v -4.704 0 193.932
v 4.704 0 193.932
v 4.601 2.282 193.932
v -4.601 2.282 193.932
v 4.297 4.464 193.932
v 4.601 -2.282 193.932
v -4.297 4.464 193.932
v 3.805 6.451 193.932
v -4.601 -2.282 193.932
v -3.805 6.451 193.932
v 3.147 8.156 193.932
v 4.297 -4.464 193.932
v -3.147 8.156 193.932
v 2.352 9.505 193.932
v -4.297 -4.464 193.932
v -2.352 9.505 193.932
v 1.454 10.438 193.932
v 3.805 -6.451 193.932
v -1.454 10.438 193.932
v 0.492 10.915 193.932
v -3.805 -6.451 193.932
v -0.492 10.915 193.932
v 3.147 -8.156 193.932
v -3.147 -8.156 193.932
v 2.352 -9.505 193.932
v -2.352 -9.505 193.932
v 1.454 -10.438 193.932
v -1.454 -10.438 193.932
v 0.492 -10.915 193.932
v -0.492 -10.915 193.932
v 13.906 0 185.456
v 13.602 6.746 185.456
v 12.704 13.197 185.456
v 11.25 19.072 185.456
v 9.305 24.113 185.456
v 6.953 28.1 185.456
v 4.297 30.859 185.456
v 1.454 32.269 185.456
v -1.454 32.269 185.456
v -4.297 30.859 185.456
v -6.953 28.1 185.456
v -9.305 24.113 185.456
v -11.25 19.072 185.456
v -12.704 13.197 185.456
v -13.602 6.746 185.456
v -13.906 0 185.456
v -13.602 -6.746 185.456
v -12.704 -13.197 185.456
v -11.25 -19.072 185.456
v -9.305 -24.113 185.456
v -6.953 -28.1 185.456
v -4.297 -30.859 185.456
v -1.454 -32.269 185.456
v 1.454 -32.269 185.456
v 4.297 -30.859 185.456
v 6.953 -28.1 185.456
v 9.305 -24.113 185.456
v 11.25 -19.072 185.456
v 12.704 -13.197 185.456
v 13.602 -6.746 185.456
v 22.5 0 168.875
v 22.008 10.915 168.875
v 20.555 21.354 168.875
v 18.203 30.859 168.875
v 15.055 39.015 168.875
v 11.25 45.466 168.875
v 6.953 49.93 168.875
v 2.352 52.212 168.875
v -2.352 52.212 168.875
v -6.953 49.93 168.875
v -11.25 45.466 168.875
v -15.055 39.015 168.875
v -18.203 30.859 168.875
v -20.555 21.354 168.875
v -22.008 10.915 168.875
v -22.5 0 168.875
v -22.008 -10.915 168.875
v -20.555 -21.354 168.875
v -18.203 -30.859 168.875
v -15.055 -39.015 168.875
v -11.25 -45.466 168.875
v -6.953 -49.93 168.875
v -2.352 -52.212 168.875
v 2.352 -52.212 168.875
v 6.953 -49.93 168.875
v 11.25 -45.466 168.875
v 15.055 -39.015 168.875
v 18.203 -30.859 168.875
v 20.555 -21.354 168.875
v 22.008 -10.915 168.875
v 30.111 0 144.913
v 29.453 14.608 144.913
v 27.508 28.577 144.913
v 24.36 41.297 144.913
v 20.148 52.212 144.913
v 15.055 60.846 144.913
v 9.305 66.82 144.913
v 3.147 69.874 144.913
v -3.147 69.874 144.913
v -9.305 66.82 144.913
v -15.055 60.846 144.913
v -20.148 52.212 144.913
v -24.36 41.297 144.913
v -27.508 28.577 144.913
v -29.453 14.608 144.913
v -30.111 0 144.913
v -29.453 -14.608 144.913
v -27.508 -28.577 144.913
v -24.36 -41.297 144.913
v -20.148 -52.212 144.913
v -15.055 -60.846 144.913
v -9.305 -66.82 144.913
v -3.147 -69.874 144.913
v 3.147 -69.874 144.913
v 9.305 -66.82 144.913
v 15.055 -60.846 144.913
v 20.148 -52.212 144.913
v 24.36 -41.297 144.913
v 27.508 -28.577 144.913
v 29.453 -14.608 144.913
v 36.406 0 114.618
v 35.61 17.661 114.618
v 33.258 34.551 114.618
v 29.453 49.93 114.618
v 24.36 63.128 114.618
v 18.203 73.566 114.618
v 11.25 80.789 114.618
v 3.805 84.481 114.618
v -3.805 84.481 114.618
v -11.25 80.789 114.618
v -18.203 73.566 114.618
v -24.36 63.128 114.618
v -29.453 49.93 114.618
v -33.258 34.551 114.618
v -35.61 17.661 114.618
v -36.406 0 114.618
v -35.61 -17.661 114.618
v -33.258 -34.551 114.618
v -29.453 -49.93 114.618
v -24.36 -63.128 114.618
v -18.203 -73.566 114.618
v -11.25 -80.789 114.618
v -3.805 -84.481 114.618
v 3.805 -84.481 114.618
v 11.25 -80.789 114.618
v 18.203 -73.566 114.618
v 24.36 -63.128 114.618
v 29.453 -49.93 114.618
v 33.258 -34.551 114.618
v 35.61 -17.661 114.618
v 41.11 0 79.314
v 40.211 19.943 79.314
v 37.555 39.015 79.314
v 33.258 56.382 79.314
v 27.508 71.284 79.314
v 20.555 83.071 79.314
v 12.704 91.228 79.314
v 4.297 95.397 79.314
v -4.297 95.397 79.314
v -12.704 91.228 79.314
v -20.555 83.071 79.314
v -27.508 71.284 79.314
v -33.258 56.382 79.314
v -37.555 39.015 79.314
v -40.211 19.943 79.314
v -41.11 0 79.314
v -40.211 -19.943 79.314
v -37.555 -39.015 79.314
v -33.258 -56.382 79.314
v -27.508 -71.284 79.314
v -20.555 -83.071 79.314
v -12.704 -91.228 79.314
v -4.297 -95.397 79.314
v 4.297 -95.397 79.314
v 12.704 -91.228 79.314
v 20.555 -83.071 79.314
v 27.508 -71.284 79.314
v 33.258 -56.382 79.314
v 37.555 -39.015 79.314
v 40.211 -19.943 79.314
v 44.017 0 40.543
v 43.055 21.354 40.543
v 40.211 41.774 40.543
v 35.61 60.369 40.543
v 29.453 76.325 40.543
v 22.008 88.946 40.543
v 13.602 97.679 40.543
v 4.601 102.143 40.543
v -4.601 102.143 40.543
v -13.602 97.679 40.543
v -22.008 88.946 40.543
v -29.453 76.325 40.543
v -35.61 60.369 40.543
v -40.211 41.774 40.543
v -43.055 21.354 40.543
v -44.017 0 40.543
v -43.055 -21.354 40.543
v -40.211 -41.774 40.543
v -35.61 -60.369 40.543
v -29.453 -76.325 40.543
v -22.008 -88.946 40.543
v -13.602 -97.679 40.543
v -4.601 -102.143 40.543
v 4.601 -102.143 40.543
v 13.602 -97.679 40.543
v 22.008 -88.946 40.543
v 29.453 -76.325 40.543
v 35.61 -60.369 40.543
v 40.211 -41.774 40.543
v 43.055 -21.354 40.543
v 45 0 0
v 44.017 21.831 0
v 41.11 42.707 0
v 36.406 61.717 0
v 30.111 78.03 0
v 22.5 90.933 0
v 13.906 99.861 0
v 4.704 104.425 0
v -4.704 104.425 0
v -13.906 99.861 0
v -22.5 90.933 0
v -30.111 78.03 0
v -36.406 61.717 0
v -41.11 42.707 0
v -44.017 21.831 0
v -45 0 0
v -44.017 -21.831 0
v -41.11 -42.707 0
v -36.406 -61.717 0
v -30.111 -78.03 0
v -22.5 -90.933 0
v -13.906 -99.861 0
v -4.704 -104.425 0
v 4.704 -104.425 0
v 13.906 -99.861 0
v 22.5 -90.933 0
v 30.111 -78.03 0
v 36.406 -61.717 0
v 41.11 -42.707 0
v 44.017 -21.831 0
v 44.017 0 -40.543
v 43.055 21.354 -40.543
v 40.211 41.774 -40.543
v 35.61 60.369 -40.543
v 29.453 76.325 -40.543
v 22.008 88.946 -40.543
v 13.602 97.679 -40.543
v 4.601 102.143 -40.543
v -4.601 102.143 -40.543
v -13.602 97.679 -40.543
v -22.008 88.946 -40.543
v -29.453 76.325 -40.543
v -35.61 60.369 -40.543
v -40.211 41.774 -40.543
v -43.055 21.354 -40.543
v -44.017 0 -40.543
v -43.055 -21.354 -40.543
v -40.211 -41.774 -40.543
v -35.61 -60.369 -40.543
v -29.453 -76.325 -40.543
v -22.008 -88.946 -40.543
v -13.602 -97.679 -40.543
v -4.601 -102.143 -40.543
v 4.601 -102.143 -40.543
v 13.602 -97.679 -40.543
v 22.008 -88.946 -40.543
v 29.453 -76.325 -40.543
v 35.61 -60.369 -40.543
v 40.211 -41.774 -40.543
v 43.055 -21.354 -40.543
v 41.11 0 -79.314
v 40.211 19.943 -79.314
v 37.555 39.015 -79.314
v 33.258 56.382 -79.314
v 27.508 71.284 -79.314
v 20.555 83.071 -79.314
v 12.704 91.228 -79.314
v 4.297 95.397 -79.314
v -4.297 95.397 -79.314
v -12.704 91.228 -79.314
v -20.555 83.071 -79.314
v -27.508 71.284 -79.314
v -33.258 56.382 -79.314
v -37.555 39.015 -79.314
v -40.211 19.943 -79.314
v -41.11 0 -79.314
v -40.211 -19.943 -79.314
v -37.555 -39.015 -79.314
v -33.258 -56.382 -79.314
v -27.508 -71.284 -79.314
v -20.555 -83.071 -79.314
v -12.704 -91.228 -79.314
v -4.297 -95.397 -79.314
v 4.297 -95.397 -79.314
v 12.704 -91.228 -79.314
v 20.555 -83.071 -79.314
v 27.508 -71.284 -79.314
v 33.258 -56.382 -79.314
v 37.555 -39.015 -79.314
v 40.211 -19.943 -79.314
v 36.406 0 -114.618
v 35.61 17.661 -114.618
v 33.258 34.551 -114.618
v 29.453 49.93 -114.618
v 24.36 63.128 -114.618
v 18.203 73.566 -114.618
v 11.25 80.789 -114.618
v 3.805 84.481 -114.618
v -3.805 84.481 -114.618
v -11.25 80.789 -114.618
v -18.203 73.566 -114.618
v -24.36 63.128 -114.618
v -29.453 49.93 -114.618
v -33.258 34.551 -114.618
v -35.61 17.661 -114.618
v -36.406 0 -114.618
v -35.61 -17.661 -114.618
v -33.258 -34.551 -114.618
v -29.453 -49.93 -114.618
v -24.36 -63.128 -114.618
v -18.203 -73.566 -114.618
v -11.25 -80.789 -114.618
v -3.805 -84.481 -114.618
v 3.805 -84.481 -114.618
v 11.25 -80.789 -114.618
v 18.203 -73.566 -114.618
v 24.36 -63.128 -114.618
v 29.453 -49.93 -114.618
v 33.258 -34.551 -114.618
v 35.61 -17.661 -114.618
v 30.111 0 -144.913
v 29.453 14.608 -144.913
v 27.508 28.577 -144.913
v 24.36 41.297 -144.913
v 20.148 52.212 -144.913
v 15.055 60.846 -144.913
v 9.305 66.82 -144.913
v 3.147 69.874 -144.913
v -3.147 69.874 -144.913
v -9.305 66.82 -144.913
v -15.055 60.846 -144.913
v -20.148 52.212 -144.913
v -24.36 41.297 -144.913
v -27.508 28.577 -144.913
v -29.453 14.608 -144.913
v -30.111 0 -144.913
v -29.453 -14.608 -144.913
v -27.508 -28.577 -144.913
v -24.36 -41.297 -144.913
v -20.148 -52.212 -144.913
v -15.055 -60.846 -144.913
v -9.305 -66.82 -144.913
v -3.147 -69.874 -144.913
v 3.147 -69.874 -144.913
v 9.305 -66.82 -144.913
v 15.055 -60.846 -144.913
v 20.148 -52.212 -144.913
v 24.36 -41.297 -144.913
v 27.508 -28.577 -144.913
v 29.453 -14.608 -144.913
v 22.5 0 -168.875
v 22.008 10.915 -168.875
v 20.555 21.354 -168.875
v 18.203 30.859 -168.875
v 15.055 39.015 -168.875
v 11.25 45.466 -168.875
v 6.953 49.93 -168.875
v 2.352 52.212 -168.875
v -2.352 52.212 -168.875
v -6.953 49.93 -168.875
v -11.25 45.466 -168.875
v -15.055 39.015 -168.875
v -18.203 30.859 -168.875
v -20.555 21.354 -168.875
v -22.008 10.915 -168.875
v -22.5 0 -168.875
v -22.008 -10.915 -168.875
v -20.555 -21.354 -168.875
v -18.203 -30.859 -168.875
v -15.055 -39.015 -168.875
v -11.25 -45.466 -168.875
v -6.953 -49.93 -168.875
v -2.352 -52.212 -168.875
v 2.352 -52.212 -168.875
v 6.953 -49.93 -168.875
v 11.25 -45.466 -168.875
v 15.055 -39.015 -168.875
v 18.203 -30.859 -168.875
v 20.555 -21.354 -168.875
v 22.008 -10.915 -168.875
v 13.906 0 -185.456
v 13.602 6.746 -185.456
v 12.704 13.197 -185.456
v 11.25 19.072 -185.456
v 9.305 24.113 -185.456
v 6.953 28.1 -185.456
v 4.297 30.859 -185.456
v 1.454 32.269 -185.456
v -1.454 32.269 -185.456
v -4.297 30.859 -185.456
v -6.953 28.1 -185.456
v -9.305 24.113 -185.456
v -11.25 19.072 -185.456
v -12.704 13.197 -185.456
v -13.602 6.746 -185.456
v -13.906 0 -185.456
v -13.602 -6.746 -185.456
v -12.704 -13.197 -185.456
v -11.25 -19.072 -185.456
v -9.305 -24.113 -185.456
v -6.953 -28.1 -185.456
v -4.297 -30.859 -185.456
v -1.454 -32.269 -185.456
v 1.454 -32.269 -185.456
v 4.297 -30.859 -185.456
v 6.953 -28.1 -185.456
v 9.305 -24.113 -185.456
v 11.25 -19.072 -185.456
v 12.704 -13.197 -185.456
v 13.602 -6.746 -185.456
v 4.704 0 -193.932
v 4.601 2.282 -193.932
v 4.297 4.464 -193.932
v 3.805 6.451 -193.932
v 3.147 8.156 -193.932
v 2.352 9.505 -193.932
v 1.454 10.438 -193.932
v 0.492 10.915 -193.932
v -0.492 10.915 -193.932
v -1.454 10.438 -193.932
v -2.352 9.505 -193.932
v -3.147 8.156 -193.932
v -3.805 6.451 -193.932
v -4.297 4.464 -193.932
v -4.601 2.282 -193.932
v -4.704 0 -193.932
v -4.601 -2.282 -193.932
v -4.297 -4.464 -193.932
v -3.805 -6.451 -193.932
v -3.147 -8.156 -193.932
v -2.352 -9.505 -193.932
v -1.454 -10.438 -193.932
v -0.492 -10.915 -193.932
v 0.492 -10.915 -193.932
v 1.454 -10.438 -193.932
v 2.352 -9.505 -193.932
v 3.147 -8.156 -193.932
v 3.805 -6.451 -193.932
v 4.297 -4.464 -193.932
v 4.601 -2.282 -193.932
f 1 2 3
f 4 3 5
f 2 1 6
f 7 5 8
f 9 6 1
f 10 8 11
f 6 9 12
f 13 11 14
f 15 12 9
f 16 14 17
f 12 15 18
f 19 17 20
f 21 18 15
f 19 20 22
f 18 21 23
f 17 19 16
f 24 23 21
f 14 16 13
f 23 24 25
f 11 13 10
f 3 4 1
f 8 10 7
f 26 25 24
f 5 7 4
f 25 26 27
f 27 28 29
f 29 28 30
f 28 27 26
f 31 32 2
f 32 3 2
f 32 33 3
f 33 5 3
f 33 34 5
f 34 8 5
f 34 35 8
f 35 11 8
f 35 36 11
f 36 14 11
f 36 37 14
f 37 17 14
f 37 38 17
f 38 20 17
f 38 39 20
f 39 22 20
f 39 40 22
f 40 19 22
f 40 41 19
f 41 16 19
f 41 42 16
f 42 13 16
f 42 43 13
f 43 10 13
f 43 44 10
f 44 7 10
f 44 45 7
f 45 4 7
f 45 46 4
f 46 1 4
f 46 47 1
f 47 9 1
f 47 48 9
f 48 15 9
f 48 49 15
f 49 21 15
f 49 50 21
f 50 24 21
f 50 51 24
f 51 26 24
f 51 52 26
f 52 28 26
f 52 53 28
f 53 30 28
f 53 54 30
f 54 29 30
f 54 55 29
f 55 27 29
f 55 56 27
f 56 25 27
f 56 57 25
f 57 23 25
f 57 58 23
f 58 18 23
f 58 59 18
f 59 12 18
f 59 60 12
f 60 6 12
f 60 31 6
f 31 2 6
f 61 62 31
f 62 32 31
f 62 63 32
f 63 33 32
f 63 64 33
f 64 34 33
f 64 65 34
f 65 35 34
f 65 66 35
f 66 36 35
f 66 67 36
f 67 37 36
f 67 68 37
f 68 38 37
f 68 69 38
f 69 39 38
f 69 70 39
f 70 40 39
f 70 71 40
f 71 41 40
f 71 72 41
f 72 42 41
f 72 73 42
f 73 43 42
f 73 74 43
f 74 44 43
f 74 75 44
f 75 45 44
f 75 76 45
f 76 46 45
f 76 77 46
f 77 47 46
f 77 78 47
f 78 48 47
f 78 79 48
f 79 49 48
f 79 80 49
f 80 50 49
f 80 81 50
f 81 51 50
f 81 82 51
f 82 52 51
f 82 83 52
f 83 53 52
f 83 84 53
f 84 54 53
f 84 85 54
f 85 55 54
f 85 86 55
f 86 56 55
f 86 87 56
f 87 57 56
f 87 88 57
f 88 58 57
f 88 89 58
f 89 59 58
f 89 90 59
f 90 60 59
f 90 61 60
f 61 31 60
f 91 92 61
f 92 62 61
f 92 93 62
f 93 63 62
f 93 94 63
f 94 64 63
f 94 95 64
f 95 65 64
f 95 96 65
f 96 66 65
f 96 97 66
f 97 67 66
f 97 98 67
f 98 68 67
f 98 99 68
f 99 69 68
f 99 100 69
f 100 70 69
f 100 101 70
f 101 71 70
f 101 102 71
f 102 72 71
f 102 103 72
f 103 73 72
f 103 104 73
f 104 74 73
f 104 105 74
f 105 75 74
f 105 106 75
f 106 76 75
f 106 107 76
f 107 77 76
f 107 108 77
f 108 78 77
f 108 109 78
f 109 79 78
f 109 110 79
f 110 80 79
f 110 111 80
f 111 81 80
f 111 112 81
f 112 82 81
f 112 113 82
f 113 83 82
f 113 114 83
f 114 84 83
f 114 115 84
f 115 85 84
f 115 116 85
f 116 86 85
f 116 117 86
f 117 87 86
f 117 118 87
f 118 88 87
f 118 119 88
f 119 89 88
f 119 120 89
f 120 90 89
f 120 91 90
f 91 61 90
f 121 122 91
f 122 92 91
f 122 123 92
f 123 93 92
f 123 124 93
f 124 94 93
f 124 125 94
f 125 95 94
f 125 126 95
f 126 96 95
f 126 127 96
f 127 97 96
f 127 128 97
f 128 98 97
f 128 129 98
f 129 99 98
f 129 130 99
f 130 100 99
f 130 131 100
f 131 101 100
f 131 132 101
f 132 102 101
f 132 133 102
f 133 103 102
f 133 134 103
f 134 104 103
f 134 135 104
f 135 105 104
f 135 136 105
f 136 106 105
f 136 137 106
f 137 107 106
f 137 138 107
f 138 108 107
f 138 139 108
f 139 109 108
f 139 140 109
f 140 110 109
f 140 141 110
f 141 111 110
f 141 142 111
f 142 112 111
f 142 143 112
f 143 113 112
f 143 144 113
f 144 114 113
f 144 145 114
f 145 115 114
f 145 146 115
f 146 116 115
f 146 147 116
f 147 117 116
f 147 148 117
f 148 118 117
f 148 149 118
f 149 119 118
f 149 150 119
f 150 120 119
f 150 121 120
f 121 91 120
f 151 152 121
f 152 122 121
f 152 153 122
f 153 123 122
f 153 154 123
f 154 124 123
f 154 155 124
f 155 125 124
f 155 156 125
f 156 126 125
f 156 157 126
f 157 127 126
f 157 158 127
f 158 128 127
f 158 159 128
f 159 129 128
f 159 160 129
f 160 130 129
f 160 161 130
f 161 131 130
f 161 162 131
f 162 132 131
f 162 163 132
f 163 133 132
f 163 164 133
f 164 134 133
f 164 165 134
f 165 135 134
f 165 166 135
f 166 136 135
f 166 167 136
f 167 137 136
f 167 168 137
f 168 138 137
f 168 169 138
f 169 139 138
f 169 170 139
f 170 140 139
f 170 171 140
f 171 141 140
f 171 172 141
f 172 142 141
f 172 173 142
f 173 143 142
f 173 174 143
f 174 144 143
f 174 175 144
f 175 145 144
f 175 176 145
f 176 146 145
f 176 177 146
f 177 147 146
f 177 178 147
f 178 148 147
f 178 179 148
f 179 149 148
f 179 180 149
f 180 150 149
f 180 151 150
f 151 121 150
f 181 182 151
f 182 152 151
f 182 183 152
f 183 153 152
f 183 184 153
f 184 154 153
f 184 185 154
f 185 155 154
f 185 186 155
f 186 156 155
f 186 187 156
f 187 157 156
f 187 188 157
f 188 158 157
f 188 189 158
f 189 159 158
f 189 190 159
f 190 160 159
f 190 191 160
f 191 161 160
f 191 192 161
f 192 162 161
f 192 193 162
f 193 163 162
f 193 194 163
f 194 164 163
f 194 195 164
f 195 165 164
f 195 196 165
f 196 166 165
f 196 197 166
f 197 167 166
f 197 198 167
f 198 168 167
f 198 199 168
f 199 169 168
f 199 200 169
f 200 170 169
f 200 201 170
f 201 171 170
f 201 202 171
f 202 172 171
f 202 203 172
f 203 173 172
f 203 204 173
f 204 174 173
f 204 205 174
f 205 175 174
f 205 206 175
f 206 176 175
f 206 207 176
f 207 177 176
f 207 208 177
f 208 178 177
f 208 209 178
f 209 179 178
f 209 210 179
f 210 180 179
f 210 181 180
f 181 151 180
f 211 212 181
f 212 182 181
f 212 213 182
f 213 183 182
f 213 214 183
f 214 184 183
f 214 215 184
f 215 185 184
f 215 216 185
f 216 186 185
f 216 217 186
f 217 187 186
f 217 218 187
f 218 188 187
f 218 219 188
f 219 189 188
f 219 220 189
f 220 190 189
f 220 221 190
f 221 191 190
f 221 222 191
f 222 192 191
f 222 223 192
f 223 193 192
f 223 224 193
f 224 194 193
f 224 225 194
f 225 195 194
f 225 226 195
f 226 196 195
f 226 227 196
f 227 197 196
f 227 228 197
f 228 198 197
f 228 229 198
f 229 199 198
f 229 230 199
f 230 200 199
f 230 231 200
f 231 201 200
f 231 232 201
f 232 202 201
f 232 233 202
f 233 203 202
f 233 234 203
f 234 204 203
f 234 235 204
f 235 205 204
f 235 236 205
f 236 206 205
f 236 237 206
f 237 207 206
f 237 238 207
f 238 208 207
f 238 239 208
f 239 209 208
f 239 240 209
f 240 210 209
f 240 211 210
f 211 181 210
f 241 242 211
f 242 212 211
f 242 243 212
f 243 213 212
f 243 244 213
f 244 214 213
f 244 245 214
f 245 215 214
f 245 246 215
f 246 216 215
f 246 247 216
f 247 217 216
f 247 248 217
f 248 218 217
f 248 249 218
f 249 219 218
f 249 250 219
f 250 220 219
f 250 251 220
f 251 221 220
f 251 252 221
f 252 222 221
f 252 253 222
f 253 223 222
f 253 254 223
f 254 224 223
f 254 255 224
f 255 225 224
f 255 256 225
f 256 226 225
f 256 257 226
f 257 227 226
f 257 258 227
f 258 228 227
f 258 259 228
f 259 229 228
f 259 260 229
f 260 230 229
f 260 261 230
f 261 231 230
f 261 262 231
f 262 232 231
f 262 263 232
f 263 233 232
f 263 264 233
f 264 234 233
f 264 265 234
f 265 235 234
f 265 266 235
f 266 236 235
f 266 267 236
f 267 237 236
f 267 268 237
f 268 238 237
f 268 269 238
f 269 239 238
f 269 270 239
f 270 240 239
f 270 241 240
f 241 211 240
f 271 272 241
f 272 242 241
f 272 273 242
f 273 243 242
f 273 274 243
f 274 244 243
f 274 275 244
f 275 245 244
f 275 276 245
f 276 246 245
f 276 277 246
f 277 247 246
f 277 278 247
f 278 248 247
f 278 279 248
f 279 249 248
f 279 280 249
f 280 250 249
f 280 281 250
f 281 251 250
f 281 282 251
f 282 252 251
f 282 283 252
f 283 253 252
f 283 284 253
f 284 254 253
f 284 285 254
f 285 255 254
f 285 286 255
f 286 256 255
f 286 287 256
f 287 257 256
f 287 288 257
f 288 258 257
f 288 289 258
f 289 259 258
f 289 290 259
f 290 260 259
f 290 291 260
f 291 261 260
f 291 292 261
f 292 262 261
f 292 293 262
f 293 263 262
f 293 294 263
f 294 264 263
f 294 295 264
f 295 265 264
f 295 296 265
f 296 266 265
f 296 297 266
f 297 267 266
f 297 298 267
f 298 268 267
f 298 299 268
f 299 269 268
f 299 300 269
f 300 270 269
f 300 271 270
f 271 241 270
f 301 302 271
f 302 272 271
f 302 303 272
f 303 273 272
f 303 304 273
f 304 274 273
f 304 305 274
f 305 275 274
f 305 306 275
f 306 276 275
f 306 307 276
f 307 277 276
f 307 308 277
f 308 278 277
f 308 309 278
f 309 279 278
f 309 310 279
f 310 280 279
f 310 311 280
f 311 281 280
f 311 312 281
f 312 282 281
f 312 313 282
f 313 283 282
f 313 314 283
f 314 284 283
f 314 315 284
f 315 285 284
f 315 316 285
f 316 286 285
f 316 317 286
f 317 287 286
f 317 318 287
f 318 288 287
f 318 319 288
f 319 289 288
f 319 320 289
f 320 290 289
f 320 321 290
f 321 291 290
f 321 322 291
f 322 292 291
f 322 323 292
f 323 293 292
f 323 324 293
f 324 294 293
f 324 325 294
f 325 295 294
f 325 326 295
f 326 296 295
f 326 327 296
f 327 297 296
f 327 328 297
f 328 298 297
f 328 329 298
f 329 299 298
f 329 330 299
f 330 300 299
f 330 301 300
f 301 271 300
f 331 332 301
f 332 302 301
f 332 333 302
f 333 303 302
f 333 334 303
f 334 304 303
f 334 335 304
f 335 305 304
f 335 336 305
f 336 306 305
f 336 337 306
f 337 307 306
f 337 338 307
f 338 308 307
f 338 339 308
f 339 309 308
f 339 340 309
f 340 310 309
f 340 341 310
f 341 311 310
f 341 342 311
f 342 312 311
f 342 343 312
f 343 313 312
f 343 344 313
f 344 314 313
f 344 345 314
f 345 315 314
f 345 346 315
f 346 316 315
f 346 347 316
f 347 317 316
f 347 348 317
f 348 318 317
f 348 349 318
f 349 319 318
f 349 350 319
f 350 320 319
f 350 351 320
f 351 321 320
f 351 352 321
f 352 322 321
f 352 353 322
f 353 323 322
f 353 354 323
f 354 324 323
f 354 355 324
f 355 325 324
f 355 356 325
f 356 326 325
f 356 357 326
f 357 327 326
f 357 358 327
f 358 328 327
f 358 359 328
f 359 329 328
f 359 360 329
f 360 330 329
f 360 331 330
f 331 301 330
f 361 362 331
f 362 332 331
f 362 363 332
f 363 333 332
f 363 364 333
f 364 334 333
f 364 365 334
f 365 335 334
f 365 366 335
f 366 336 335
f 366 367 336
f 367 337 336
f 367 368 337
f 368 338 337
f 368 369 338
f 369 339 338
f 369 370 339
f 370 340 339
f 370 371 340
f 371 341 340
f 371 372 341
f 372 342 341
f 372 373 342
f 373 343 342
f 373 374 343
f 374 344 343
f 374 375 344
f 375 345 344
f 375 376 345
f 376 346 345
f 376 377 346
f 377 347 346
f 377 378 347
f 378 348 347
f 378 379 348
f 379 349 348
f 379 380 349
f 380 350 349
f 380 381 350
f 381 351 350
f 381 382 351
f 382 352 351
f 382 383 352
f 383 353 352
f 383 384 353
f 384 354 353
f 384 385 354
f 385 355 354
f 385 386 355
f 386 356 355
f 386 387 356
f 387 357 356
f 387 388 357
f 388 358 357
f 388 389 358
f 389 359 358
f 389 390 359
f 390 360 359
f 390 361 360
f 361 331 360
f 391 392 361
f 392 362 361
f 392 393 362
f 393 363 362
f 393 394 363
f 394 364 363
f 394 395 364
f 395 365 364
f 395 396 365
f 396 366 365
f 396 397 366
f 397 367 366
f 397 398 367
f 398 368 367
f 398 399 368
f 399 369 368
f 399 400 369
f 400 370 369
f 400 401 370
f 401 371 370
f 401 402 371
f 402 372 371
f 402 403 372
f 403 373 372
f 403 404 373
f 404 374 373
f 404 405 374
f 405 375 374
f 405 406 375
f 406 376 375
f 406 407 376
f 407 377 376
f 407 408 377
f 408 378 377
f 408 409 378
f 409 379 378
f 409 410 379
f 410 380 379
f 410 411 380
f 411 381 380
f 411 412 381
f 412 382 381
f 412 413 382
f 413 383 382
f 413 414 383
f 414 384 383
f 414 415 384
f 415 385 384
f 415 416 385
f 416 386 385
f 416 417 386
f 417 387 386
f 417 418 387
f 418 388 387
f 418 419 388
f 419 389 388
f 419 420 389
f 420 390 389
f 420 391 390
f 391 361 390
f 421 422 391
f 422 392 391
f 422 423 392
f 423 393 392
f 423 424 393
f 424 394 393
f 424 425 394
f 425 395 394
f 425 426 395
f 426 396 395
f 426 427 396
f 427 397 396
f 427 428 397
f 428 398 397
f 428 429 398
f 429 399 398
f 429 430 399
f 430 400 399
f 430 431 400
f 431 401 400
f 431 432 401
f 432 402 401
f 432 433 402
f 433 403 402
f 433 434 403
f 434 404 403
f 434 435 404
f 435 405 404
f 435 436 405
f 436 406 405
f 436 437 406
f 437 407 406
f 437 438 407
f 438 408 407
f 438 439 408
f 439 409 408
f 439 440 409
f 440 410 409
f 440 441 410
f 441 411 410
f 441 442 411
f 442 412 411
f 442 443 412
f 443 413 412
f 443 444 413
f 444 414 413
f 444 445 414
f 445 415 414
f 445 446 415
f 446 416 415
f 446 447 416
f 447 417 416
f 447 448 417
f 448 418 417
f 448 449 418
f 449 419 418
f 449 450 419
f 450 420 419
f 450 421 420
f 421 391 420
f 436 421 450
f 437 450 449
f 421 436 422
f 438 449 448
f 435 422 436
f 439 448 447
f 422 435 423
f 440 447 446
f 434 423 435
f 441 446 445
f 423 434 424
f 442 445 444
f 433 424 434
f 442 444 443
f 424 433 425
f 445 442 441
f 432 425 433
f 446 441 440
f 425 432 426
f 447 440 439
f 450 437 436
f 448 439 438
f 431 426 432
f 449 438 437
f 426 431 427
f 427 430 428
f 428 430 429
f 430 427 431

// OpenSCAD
// Generated by SolidPython 1.0.1 on 2020-07-29 00:46:45


scale(v = [3, 7, 13]) {
	sphere(r = 15);
}
/***********************************************
*********      SolidPython code:      **********
************************************************
 
# import packages: SolidPython
from solid import *
from solid.utils import *
from itertools import chain, combinations, permutations


class Resize:

    def __init__(self, scad_file):
        self.scad_file = scad_file
        #self.scad_file = import_scad(scad_file)
        # cone/cylinder param:
        self.r1 = 0
        self.r2 = 0
        self.h = 0
        # rectangular prism param:
        self.w = 0
        self.l = 0
        # ellipse param:
        self.r = 0

    # import OpenScad code (file name corresponds to shape)


    # classify shape + parameters
    def assign(self, param1, param2, param3):
        if self.scad_file == 'cone.scad':
            self.r1 = param1
            self.r2 = param2
            self.h = param3
        elif self.scad_file == 'cylinder.scad':
            self.r1 = param1
            self.r2 = param2
            self.h = param3
        elif self.scad_file == 'rectangularPrism.scad':
            self.h = param1
            self.l = param2
            self.w = param3
        else:
            self.r = param1
            self.h = param2

    # resize parameters
    def iterate(self):
        x = range(3, 20, 2)
        i = 1
        if self.scad_file == 'cone.scad':
            tempList = list(permutations(x, 2))
            for temp in tempList:
                param1 = temp[0]
                param2 = temp[1]
                filepath = 'produced_scad_files/' + 'cone' + str(param1) + '_' + str(param2) + '_' + '.scad'
                scad_render_to_file(cylinder(h=param1, r1=param2, r2=0), filepath)

        elif self.scad_file == 'cylinder.scad':
            tempList = list(permutations(x, 3))
            for temp in tempList:
                param1 = temp[0]
                param2 = temp[1]
                filepath = 'produced_scad_files/' + 'cylinder' + str(param1) + '_' + str(param2) + '_' + '.scad'
                scad_render_to_file(cylinder(h=param1, r1=param2, r2=param2), filepath)

        elif self.scad_file == 'rectangularPrism.scad':
            tempList = list(permutations(x, 3))
            for temp in tempList:
                param1 = temp[0]
                param2 = temp[1]
                param3 = temp[2]
                filepath = 'produced_scad_files/' + 'rectangularPrism' + str(param1) + '_' + str(param2) + '_' + str(
                    param3) + '.scad'
                scad_render_to_file(cube(size=(param1, param2, param3)), filepath)

        elif self.scad_file == 'ellipse.scad':
            tempList = list(permutations(x, 4))
            for temp in tempList:
                param1 = temp[0]
                param2 = temp[1]
                param3 = temp[2]
                param4 = temp[3]
                filepath = 'produced_scad_files/' + 'ellipse' + str(param1) + '_' + str(param2) + '_' + str(param3) + '_' + str(param4) + '.scad'
                scad_render_to_file(scale([param1, param2, param3])(sphere(r=param4)), filepath)

    def render_to_scadfile(self):
        scad_render_to_file(scad, 'example.scad') 
 
************************************************/
